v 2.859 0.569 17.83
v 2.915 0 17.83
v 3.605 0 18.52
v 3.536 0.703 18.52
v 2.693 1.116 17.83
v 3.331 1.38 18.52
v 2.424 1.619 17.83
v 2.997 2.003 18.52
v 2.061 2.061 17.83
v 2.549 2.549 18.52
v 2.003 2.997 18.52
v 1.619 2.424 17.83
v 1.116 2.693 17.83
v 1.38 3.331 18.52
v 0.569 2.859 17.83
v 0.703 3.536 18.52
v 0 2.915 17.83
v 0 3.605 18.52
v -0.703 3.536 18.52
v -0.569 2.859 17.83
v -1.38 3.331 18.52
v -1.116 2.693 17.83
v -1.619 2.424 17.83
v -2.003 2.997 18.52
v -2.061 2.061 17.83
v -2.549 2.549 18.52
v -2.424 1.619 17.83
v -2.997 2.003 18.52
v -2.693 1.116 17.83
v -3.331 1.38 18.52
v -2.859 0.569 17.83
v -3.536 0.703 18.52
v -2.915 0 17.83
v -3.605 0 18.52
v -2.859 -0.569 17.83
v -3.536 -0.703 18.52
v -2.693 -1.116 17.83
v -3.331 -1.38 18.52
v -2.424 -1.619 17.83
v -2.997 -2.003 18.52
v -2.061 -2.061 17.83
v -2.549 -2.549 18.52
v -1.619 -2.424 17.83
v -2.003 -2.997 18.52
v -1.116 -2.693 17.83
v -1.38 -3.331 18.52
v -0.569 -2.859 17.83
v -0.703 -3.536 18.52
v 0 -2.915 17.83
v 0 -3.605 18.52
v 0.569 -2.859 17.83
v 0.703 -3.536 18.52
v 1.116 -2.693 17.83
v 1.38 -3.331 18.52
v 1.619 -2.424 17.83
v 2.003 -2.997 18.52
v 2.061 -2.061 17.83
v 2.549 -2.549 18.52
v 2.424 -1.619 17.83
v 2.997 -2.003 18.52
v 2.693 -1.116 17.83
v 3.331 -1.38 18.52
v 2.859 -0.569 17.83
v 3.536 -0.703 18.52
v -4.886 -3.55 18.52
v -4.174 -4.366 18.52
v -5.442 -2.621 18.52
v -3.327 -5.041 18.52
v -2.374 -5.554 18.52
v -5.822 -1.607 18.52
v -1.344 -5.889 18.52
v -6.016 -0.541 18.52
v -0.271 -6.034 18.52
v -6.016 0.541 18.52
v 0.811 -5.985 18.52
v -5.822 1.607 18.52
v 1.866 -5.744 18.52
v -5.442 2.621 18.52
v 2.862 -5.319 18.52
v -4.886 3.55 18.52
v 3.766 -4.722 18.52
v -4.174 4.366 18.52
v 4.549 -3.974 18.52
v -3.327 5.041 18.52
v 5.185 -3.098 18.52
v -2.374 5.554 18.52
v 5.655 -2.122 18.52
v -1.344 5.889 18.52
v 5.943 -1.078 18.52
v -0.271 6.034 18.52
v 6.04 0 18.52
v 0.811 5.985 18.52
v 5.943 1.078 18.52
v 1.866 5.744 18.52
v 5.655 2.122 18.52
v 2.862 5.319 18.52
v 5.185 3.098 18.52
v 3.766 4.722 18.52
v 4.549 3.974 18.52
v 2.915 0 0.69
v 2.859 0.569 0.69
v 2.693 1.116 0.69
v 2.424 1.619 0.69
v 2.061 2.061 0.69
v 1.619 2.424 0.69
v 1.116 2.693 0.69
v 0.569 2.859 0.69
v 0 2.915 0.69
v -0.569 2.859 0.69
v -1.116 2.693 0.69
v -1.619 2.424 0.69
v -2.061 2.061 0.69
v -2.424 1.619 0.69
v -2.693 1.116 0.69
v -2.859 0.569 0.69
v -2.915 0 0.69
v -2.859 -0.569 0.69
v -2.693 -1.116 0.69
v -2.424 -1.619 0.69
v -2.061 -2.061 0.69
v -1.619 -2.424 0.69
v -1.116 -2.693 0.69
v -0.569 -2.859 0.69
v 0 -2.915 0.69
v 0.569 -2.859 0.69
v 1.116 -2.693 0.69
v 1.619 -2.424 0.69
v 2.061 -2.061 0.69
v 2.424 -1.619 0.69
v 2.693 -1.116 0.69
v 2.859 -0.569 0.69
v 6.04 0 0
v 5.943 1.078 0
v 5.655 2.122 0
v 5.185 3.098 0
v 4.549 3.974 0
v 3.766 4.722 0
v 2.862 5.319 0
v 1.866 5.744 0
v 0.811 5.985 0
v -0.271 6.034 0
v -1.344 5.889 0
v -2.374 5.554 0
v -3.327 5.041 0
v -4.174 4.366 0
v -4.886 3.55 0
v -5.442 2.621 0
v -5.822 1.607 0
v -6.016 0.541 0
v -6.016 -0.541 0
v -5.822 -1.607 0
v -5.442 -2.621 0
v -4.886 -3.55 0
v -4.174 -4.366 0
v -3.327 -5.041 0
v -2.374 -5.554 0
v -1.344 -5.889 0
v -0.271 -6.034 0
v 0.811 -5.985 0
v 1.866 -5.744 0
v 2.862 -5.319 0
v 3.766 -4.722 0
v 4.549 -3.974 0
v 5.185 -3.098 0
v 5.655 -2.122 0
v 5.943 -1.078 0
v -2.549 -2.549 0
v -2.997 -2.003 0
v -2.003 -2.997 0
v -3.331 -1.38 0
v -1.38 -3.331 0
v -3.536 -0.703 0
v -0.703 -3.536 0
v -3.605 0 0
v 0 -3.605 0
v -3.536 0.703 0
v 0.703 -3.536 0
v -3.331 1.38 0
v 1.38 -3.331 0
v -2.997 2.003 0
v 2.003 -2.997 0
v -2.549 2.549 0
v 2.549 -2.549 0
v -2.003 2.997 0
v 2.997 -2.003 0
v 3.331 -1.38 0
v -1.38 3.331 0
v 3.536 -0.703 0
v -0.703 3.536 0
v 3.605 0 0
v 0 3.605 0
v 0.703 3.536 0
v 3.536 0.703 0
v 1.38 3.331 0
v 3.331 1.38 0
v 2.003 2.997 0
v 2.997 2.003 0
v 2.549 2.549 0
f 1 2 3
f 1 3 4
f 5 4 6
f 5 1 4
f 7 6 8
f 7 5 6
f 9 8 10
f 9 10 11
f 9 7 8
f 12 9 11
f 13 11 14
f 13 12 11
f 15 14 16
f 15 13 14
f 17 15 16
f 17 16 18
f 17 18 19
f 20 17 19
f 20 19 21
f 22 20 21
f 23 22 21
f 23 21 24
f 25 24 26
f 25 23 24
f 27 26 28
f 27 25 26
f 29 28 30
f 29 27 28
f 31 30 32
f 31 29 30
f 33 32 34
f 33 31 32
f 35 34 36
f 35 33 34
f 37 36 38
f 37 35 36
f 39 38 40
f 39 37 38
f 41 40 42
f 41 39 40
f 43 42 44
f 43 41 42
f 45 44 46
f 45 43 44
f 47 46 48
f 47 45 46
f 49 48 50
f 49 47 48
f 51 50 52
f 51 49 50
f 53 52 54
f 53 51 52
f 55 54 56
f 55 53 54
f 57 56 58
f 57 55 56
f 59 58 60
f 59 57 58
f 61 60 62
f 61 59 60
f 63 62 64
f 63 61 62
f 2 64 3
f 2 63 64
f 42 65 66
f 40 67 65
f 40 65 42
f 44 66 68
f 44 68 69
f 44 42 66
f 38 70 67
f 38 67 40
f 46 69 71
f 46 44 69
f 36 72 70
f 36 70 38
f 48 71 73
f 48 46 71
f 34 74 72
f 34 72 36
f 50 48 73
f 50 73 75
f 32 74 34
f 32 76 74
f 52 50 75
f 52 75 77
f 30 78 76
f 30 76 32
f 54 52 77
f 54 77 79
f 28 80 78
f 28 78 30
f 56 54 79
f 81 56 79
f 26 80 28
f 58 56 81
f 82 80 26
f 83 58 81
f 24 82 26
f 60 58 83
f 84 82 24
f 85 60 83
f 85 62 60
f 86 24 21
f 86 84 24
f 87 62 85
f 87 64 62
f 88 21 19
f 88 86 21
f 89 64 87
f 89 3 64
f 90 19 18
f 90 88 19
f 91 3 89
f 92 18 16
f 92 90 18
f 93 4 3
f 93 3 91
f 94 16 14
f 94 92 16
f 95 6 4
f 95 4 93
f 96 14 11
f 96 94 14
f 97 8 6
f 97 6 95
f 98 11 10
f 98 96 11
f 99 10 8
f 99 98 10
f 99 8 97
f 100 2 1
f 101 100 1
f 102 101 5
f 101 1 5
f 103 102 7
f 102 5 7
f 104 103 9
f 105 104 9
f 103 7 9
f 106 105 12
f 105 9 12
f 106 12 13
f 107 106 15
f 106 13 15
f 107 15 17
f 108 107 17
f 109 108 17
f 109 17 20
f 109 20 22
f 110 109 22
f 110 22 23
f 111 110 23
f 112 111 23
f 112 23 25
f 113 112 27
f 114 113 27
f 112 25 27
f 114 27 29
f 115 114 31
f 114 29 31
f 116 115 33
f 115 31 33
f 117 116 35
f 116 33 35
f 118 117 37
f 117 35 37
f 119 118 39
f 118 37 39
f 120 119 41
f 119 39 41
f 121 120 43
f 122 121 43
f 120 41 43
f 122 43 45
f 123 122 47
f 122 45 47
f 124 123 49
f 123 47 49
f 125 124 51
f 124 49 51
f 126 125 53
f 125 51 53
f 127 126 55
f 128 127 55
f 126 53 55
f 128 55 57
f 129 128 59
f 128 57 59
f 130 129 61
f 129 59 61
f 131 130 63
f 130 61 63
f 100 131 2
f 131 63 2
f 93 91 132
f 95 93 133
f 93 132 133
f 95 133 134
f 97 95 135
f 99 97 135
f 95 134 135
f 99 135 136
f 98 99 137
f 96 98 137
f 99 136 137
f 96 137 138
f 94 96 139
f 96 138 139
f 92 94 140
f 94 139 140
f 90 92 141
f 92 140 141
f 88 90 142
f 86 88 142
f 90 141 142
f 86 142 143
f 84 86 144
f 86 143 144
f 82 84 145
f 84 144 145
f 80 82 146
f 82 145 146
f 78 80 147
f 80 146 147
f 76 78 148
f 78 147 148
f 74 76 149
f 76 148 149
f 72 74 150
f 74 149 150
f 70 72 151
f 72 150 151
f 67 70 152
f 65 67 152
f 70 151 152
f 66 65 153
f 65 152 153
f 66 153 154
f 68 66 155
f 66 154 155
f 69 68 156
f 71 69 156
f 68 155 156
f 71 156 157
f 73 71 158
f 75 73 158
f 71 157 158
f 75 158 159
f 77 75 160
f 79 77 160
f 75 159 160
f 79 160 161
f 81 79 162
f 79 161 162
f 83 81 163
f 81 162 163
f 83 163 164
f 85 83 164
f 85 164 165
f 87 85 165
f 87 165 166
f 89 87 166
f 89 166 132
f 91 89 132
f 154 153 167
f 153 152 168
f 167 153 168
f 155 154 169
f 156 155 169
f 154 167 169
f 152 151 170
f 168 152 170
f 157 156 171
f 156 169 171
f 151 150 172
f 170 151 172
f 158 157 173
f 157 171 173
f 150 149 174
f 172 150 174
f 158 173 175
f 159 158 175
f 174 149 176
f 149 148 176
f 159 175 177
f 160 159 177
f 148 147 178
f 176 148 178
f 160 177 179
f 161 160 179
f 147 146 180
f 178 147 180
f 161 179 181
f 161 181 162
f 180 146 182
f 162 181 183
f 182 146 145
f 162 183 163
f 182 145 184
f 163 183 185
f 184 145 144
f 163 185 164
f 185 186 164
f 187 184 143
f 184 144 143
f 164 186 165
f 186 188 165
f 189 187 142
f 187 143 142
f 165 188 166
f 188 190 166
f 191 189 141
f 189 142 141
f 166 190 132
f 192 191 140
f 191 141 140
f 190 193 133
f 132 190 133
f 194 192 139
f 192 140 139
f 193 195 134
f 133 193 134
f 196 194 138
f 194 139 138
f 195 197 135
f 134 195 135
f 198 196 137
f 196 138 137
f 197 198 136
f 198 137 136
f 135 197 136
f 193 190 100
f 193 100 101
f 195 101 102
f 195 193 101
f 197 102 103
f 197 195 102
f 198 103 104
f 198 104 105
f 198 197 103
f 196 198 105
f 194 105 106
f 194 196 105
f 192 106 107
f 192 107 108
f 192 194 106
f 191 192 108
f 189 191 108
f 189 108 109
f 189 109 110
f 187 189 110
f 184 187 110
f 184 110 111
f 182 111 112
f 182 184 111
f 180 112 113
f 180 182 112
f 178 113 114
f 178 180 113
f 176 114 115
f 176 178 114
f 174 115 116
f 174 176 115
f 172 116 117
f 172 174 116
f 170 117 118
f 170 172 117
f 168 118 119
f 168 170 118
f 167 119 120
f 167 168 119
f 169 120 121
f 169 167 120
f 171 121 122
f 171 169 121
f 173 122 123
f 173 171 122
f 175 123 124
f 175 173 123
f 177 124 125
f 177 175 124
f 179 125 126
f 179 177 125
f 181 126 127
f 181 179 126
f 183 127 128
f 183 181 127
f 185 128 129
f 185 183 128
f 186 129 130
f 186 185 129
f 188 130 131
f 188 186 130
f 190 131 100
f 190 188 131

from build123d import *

# Parameters (mm, degrees)
SKETCH1_R           = 6.04
BOSS_EXTRUDE1_DEPTH = 18.52
SKETCH2_R           = 2.405
CUT_EXTRUDE1_DEPTH  = 18.52
SKETCH3_R           = 2.915
CUT_EXTRUDE2_DEPTH  = 18.52
CHAMFER1_SIZE       = 0.69
CHAMFER2_SIZE       = 0.69


with BuildPart() as part:
    # Sketch1 → Boss-Extrude1 (new body)
    with BuildSketch(Plane.XY):
        Circle(SKETCH1_R)
    extrude(amount=BOSS_EXTRUDE1_DEPTH)

    # Sketch2 → Cut-Extrude1 (cut)
    with BuildSketch(Plane.XY.offset(18.52)):
        Circle(SKETCH2_R)
    extrude(amount=-CUT_EXTRUDE1_DEPTH, mode=Mode.SUBTRACT)

    # Sketch3 → Cut-Extrude2 (cut)
    with BuildSketch(Plane.XY.offset(18.52)):
        Circle(SKETCH3_R)
    extrude(amount=-CUT_EXTRUDE2_DEPTH, mode=Mode.SUBTRACT)

    # Chamfer1
    chamfer1_edges = [part.edges().sort_by_distance(p)[0] for p in [
        (-2.915, 0, 18.52),
    ]]
    chamfer(chamfer1_edges, length=CHAMFER1_SIZE)

    # Chamfer2
    chamfer2_edges = [part.edges().sort_by_distance(p)[0] for p in [
        (-2.915, 0, 0),
    ]]
    chamfer(chamfer2_edges, length=CHAMFER2_SIZE)


solid = part.part
